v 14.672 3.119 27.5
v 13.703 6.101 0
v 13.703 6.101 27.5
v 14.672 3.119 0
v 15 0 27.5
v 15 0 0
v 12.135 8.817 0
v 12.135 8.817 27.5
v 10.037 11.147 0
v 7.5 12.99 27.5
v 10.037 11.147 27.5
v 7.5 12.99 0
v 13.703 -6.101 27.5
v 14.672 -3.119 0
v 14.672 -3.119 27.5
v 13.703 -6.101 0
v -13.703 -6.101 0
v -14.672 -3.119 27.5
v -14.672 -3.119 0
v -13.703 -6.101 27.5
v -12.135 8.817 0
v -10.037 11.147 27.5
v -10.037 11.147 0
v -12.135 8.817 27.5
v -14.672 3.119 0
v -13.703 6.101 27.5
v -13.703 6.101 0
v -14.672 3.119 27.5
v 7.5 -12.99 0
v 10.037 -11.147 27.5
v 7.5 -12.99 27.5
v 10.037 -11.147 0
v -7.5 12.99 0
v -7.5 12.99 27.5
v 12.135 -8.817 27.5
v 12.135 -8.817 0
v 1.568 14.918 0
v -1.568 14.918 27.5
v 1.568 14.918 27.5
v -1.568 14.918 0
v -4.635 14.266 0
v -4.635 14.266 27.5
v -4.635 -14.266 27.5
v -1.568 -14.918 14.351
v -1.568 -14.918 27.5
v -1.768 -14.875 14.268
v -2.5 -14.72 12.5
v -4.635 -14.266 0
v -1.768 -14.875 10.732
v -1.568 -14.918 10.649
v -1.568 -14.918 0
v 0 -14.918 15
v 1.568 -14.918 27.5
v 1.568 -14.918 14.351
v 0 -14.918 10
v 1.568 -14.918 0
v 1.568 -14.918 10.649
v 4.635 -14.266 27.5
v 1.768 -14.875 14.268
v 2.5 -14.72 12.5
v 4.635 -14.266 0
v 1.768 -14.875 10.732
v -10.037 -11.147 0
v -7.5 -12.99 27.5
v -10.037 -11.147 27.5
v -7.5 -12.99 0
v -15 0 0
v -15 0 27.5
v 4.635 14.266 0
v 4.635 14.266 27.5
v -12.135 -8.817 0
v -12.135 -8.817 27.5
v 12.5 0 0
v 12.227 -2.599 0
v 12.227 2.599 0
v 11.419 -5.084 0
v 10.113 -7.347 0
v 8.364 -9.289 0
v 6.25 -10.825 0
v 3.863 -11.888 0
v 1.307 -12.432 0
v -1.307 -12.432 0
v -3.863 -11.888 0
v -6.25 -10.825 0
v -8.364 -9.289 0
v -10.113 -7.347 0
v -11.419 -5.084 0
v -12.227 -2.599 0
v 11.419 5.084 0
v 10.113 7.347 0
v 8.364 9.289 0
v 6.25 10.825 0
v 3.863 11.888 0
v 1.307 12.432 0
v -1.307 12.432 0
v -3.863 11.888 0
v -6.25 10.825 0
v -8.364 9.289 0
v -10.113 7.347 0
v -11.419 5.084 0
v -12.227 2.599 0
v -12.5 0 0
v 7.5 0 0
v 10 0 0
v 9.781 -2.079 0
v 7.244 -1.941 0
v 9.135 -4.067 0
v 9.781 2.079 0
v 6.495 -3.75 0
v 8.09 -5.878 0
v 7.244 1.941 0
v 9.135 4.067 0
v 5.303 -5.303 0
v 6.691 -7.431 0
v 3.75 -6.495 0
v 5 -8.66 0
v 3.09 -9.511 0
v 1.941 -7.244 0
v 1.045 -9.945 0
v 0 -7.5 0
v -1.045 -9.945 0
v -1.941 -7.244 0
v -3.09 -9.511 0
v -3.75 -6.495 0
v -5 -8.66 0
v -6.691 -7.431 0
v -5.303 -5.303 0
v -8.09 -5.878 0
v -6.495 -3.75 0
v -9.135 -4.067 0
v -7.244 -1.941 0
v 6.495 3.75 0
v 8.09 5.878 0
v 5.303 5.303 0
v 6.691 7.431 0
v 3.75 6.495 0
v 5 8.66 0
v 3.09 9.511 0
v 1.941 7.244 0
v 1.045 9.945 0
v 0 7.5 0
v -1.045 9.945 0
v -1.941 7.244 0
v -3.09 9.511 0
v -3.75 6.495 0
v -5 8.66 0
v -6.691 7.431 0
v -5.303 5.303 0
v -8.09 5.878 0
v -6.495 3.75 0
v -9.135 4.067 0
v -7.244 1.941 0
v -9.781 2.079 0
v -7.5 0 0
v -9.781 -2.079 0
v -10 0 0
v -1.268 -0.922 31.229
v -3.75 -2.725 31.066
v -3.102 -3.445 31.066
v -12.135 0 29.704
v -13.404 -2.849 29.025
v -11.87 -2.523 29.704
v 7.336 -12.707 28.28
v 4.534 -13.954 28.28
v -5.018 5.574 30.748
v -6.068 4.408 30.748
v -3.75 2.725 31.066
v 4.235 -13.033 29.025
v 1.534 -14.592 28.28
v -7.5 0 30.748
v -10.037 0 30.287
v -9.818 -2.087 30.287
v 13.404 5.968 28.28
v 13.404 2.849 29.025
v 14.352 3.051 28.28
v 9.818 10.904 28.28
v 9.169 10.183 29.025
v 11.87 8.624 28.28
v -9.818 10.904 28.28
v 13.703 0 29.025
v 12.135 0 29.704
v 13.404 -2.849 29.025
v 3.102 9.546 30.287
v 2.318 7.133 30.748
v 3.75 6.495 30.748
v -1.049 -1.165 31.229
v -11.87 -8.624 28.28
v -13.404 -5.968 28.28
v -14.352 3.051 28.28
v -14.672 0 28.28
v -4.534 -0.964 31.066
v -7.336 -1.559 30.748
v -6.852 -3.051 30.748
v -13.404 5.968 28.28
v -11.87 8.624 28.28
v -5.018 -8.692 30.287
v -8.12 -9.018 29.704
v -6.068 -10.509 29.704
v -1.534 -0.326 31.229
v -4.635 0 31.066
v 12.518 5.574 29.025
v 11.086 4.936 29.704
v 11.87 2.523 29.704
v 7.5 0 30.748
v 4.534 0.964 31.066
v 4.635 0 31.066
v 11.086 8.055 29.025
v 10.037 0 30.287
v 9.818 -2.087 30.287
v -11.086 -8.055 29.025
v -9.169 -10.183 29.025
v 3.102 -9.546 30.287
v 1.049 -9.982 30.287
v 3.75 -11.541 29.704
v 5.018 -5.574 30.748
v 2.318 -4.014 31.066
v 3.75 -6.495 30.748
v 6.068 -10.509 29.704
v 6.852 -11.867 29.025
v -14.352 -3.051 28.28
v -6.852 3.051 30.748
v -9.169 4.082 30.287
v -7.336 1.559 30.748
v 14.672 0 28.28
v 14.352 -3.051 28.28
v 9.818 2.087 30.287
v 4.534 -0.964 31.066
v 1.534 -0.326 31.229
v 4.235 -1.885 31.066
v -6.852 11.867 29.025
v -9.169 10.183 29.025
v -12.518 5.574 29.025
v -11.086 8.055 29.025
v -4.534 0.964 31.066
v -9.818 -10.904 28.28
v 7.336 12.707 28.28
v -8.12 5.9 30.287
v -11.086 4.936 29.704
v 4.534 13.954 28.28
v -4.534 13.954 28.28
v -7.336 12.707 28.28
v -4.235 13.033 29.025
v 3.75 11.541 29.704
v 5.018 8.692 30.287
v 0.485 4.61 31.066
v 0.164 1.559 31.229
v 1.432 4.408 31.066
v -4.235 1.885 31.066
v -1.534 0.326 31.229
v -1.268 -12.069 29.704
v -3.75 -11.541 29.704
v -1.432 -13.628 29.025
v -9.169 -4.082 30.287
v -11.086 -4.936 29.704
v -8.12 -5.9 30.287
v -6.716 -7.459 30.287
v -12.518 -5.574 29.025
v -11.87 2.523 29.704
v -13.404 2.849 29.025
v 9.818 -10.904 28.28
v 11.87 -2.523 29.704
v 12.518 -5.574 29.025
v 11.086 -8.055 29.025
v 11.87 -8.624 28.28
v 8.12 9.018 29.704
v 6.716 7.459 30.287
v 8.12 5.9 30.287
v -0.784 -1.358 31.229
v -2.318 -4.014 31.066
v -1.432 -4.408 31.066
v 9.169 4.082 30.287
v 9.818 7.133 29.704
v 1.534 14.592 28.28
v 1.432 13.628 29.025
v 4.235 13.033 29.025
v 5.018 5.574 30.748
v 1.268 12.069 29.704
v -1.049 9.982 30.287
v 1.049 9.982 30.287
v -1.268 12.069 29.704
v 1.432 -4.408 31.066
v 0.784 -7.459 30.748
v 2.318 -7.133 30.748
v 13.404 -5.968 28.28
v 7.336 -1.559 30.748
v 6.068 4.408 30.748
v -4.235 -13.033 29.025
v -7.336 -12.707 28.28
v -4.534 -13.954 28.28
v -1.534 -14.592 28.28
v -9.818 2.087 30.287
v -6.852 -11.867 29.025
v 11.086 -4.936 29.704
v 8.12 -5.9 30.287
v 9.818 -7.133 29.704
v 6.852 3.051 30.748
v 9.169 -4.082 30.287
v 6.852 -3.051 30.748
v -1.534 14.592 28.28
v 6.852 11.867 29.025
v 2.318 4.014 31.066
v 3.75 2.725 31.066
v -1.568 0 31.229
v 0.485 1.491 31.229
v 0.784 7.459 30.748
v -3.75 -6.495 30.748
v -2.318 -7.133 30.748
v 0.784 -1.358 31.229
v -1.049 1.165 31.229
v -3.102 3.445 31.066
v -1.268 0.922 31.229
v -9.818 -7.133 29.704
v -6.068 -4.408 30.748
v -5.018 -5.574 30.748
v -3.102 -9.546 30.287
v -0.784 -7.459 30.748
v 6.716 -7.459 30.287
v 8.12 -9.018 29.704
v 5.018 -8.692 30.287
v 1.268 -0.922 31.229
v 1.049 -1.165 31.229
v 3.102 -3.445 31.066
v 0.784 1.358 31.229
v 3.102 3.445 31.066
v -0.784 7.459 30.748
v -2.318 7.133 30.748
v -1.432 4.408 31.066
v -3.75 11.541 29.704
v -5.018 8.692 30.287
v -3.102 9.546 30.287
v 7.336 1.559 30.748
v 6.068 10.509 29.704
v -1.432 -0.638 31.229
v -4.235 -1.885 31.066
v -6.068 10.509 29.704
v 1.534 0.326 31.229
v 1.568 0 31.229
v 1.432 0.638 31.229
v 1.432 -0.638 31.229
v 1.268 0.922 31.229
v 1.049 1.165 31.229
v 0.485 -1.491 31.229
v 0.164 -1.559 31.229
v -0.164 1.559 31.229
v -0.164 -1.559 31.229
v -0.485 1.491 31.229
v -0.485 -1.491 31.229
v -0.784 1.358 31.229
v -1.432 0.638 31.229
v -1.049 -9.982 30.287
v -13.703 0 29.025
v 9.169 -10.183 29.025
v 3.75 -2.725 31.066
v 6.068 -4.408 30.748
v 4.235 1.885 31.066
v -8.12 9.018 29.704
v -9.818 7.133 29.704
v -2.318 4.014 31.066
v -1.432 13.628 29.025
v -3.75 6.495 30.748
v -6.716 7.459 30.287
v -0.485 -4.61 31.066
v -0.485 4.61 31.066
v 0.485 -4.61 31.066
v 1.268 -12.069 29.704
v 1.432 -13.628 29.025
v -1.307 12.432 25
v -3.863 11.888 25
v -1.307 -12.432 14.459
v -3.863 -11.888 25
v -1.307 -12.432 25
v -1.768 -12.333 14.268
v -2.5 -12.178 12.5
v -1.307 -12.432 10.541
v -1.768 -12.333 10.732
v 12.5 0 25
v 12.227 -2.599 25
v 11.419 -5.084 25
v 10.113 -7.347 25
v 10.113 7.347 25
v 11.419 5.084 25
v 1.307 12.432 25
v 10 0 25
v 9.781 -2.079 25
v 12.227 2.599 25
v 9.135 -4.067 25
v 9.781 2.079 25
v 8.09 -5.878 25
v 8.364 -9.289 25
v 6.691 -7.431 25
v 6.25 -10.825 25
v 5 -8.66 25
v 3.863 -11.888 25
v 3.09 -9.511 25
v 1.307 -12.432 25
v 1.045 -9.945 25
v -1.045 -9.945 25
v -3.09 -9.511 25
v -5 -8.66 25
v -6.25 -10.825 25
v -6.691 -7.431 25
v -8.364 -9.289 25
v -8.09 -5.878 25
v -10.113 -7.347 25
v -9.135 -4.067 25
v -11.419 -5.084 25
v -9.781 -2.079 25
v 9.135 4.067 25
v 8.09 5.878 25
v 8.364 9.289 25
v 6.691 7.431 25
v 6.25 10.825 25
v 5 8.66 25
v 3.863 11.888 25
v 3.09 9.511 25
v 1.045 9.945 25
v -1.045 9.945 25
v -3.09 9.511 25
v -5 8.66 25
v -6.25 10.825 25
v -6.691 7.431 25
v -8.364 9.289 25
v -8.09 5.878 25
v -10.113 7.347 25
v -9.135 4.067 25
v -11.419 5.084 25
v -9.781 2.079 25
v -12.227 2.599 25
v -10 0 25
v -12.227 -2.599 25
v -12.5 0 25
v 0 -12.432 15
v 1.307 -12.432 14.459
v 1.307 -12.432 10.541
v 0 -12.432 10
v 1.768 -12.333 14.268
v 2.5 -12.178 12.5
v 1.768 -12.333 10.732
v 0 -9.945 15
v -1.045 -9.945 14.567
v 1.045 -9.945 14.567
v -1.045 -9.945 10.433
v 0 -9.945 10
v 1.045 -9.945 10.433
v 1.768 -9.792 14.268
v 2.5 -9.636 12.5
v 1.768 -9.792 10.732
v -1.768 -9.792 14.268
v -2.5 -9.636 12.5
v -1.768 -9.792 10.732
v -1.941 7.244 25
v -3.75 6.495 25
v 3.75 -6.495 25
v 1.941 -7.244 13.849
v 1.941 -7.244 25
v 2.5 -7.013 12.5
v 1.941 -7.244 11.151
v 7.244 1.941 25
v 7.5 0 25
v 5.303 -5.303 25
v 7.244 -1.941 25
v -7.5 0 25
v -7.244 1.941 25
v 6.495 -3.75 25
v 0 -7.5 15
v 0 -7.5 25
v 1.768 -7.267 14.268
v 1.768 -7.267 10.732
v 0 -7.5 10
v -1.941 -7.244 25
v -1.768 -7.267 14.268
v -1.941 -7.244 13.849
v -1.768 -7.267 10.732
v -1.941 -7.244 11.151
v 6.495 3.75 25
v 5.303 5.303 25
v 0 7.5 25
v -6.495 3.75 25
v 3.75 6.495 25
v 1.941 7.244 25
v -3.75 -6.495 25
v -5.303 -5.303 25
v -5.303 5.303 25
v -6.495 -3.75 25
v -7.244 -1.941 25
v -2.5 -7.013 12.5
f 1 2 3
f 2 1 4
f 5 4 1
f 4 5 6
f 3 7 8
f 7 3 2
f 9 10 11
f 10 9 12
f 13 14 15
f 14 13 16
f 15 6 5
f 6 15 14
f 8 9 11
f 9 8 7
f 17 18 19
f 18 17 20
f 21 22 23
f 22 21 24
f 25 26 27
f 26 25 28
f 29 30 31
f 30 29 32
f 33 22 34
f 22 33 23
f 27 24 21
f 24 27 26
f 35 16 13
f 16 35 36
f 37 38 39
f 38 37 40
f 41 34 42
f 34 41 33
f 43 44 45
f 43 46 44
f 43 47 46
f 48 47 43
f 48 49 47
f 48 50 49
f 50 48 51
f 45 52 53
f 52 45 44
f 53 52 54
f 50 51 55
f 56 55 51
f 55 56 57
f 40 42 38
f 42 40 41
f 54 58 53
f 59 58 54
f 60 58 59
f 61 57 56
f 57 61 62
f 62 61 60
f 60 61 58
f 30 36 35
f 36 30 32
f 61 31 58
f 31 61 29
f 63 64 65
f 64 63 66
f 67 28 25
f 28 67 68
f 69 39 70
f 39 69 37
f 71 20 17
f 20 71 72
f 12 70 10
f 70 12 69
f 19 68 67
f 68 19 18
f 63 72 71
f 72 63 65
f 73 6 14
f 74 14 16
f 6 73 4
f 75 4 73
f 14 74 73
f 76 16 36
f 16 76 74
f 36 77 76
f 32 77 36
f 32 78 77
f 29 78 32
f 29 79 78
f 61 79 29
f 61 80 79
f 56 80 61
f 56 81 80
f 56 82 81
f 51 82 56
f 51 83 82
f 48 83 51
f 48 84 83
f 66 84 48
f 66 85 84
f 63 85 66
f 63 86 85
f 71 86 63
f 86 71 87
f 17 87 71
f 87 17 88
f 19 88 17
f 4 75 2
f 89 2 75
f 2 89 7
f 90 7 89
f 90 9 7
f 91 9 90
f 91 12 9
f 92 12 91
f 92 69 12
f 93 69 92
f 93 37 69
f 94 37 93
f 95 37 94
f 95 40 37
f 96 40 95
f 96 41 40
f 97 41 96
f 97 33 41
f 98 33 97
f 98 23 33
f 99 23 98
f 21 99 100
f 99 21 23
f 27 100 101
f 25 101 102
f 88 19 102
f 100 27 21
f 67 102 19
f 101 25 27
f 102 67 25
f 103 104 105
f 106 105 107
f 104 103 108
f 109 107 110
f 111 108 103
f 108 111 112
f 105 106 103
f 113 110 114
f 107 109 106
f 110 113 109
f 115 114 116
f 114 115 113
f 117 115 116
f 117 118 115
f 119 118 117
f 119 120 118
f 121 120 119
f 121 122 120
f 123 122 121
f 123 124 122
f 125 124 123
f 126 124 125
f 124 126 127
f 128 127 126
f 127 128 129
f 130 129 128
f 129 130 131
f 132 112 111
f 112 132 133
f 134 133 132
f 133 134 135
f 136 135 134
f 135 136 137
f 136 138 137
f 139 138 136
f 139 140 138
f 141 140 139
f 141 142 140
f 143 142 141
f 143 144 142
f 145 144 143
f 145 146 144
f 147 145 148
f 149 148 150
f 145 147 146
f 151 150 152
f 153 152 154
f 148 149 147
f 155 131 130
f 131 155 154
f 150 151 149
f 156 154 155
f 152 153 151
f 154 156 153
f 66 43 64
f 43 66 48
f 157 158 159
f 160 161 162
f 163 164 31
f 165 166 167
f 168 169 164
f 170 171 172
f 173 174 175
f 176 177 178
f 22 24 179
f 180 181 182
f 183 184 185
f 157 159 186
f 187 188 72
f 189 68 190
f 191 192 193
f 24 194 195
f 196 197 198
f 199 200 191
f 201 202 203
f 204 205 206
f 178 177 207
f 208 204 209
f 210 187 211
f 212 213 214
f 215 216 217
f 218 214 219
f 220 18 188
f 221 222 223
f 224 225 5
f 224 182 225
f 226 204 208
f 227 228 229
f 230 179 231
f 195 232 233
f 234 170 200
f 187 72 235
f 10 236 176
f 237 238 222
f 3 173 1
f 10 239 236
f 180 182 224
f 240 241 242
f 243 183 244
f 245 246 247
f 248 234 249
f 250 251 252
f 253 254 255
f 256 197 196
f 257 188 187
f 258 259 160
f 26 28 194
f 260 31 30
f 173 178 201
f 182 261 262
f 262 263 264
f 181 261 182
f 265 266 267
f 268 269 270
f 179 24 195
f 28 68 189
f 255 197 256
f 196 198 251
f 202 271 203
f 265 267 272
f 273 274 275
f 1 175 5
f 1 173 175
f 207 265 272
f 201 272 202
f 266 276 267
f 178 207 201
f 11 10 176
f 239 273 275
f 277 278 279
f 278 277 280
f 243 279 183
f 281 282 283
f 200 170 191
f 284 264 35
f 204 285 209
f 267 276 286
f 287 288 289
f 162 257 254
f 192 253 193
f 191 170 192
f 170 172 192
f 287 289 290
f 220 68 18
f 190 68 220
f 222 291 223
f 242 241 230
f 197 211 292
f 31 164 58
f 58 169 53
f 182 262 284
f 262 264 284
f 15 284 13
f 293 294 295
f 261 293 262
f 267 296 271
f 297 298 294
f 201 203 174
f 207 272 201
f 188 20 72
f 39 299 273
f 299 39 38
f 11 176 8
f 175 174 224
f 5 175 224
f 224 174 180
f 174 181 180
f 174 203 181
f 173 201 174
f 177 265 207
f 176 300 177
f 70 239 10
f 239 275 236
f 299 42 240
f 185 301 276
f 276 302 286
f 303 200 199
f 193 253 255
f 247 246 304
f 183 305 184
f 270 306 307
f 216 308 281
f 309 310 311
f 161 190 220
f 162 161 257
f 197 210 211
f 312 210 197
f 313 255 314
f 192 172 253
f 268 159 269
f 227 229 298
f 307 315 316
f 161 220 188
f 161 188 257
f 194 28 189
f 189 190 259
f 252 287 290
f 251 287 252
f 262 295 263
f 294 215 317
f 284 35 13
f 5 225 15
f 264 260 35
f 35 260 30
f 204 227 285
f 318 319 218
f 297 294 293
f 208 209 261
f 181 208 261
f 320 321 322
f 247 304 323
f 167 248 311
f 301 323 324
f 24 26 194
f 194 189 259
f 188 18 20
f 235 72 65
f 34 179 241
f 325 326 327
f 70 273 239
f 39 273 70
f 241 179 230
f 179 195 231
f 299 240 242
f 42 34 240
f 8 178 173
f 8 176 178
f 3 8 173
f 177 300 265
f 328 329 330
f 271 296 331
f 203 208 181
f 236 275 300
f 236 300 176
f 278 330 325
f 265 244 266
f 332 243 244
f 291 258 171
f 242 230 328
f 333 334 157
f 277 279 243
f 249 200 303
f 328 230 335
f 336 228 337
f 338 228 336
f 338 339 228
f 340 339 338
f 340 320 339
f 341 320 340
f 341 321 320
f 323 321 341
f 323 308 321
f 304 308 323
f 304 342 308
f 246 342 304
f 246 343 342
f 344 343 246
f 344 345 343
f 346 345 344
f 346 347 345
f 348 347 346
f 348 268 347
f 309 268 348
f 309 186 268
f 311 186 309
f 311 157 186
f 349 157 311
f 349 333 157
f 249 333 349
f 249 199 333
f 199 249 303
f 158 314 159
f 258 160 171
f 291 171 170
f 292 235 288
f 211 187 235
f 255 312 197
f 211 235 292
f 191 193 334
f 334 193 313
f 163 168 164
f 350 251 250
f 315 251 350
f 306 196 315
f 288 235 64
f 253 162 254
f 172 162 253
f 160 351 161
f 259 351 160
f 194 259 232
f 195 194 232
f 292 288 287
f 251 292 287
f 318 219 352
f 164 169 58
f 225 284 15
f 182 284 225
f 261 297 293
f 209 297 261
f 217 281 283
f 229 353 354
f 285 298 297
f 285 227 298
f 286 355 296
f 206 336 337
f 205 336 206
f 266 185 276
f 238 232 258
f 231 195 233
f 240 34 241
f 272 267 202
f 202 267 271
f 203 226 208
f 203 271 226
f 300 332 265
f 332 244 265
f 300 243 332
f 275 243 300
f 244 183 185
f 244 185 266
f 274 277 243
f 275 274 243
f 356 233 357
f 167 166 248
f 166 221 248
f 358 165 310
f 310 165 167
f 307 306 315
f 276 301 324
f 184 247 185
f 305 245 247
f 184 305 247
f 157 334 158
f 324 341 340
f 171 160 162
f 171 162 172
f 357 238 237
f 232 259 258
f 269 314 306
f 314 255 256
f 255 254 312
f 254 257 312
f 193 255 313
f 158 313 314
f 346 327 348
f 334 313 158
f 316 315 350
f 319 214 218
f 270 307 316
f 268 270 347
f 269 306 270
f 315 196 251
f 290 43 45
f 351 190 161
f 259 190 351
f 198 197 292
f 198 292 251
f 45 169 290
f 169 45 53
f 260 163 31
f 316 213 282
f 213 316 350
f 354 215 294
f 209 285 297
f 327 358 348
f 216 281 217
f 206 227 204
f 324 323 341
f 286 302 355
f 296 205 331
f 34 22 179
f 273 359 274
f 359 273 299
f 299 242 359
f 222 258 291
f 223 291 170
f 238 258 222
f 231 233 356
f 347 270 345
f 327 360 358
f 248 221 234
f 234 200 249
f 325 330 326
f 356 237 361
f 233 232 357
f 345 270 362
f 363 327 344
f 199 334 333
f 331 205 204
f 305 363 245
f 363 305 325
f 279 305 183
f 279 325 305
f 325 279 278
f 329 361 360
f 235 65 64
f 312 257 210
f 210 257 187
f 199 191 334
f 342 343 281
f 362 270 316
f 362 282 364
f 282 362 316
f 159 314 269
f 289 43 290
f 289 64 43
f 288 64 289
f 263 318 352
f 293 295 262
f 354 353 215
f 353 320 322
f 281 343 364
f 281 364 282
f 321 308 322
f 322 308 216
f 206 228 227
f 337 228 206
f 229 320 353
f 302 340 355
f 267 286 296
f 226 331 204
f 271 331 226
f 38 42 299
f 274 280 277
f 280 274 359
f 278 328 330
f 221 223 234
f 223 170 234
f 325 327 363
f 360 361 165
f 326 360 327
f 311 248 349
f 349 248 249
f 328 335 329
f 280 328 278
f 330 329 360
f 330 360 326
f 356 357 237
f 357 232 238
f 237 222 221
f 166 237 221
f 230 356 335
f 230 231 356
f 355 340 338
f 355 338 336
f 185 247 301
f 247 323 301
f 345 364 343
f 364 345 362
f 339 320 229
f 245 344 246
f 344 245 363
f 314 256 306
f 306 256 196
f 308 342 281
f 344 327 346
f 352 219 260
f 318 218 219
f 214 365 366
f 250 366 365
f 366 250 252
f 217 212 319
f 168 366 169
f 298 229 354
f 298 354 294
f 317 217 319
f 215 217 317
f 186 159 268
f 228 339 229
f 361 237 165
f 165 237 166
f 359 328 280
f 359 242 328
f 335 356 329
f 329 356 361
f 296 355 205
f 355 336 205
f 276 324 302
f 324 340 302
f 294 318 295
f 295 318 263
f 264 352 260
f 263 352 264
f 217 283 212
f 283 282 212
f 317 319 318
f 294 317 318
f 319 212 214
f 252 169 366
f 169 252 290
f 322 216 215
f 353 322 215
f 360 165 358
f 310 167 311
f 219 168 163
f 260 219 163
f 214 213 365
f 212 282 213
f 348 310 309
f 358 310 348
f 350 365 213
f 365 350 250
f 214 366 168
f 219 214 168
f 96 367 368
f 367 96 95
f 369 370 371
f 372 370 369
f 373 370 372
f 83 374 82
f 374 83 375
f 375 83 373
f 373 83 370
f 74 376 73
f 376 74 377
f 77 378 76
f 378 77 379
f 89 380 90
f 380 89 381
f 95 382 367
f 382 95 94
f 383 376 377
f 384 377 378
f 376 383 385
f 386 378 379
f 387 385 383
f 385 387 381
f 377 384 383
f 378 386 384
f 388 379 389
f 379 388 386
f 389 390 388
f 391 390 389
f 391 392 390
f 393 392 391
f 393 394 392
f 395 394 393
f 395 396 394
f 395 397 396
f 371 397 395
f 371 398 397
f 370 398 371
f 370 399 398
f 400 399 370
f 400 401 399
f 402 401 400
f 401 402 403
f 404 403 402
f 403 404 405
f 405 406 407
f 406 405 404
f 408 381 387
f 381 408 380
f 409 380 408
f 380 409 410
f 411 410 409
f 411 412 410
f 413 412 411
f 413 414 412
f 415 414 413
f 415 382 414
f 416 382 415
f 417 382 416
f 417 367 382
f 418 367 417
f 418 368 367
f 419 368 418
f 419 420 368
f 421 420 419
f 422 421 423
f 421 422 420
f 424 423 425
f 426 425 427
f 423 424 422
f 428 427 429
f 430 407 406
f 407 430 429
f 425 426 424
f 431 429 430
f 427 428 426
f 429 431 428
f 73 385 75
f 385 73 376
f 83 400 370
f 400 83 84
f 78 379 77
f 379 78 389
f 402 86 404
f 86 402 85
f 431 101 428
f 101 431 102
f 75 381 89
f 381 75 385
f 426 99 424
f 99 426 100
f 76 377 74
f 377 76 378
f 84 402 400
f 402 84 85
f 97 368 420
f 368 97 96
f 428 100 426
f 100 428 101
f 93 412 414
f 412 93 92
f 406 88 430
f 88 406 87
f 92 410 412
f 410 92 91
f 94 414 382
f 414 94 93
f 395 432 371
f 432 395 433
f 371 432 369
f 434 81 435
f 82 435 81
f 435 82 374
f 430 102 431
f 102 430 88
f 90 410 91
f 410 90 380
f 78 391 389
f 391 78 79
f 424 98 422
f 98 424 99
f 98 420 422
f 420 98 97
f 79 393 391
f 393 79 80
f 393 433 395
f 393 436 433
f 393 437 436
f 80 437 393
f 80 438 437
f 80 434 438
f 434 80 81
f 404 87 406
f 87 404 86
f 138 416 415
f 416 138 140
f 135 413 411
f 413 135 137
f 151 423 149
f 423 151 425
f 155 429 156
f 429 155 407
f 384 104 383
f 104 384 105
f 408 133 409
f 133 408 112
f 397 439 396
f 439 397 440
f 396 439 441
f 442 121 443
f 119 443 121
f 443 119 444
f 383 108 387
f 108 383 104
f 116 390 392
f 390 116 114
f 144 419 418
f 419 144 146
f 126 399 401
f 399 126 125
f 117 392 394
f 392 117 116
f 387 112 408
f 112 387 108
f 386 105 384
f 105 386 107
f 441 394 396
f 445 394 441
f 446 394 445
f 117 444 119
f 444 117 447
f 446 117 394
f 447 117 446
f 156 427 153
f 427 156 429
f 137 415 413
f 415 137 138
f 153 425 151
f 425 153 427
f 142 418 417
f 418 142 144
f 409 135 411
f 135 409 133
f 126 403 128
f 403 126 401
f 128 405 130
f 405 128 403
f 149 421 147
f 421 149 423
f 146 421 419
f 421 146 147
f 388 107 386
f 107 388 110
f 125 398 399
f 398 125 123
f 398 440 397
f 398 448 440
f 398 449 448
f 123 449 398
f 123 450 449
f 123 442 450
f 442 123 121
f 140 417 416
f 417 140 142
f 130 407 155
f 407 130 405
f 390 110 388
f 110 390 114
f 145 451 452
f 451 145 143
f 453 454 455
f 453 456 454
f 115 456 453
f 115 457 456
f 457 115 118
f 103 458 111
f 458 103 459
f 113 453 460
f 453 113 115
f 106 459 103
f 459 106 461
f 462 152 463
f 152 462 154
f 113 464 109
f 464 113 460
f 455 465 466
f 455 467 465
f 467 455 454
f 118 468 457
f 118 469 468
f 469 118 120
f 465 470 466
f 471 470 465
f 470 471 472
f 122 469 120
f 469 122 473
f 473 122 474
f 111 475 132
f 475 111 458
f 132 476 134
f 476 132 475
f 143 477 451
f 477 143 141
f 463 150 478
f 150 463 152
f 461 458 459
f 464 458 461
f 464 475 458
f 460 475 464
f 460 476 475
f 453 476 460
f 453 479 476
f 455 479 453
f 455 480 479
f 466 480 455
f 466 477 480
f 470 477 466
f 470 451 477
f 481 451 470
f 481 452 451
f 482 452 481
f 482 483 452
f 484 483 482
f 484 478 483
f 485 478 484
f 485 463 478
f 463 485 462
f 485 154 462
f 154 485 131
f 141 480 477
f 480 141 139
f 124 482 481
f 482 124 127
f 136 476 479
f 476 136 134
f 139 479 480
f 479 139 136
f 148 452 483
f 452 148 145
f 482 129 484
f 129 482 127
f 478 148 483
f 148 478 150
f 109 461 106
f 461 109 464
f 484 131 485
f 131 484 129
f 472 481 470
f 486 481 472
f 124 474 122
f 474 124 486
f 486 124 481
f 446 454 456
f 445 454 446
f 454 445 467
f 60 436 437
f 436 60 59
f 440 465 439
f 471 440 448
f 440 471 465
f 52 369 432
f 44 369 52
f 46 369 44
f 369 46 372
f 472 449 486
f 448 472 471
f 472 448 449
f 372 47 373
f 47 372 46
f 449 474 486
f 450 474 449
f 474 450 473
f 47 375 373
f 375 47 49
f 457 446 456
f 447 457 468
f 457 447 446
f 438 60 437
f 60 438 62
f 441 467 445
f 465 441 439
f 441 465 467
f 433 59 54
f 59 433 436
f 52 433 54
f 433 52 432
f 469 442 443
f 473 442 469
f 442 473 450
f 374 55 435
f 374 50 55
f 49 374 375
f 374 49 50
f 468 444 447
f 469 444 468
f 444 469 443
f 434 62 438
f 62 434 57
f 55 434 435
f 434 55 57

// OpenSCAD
// Pipe or Rod Endcap
// (c) 2013, Christopher "ScribbleJ" Jansen

// Pipe or Rod Outer Diameter
pipe_outer_d = 25;
// Pipe Inner Diameter -- Set to 0 for Rod
pipe_inner_d = 20;
// Minimum Thickness of Part
cap_thickness = 2.5;
// Roundness of Endcap -- Set 0 for Flat, 1 for Sphere, in-between for rounded.
cap_roundness = 0.25;
// Length of Endcap along Pipe or Rod
cap_length = 25;

// Number of Setscrew Holes -- 0 for None
setscrew_num = 1;
// Diameter of Setscrew Holes
setscrew_d = 5;


difference()
{
  union()
  {
    cylinder(r=pipe_outer_d/2 + cap_thickness, h=cap_length + cap_thickness);
    if(cap_roundness > 0)
    {
      translate([0,0,cap_length + cap_thickness]) scale([1,1,cap_roundness]) sphere(r=pipe_outer_d/2 + cap_thickness);
    }
  }

  translate([0,0,-1])
  {
    cylinder(r=pipe_inner_d/2 - cap_thickness, h=cap_length+1);
  
    difference()
    {
      cylinder(r=pipe_outer_d/2, h=cap_length+1);
      cylinder(r=pipe_inner_d/2, h=cap_length+1);
    }
  }

  if(setscrew_num > 0)
  {
    for(x=[0:360/setscrew_num:setscrew_num*(360/setscrew_num)])
    {
      translate([0,0,cap_length/2]) rotate([90,0,x]) cylinder(r=setscrew_d/2, h=pipe_outer_d);
    }
  }
}
